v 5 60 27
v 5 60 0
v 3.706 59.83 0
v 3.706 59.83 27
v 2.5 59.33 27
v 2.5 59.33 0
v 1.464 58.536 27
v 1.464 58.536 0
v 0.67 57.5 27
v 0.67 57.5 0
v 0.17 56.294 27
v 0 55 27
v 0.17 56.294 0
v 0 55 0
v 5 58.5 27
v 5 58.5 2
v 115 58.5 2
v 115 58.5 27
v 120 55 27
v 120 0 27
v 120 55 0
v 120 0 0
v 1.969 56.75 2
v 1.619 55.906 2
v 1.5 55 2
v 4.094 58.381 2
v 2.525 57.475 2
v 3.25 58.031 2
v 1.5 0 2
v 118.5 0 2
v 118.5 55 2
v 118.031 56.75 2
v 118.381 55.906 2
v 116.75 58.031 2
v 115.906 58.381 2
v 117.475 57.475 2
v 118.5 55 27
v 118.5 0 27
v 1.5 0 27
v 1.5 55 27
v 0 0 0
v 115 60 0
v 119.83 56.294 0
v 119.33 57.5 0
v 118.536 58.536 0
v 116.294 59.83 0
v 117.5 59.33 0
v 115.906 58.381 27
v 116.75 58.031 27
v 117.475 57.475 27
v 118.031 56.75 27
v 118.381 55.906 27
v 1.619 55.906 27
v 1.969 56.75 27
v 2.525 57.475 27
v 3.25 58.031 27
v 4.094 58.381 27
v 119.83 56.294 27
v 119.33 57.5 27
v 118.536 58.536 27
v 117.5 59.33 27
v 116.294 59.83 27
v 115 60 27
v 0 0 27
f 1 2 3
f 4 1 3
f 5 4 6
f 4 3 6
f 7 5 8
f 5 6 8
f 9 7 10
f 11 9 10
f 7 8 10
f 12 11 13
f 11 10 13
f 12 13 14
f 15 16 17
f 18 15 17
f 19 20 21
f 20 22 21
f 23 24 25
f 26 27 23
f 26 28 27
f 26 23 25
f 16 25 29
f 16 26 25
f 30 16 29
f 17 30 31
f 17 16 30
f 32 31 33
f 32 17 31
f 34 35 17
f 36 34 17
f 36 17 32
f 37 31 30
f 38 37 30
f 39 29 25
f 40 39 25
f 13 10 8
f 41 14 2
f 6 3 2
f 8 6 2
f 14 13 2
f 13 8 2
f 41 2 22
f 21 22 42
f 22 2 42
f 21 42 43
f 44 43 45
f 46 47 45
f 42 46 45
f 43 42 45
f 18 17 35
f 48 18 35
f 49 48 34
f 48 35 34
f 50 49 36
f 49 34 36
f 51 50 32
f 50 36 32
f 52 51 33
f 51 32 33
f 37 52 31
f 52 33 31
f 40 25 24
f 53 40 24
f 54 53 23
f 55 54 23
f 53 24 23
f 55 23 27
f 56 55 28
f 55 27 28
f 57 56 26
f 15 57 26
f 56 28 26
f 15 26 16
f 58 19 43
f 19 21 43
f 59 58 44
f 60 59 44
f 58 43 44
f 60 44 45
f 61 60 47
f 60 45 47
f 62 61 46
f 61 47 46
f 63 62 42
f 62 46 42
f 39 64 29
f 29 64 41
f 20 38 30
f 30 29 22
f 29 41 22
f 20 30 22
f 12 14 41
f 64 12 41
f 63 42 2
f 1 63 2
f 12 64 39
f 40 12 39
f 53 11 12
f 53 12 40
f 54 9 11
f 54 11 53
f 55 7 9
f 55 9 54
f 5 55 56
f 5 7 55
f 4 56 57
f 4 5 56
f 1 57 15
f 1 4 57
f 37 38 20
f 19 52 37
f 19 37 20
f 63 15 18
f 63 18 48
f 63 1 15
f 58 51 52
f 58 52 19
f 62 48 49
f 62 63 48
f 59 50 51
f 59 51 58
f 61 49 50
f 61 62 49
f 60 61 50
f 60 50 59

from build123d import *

# Parameters (mm, degrees)
F1_DEPTH = 2
F3_DEPTH = 25


with BuildPart() as f1:
    # F0 (on Top) → F1 (new body)
    with BuildSketch(Plane.XY):
        with BuildLine():
            Line((0, 55), (0, 0))
            Line((0, 0), (120, 0))
            Line((120, 0), (120, 55))
            ThreePointArc((120, 55), (118.535534, 58.535534), (115, 60))
            Line((115, 60), (5, 60))
            ThreePointArc((5, 60), (1.464466, 58.535534), (0, 55))
        make_face()
    extrude(amount=F1_DEPTH)

    # F2 (on face) → F3 (join)
    with BuildSketch(Plane.XY.offset(2)):
        with BuildLine():
            Line((0, 55), (0, 0))
            Line((0, 0), (1.5, 0))
            Line((1.5, 0), (1.5, 55))
            ThreePointArc((1.5, 55), (2.525126, 57.474874), (5, 58.5))
            Line((5, 58.5), (115, 58.5))
            ThreePointArc((115, 58.5), (117.474874, 57.474874), (118.5, 55))
            Line((118.5, 55), (118.5, 0))
            Line((118.5, 0), (120, 0))
            Line((120, 0), (120, 55))
            ThreePointArc((120, 55), (118.535534, 58.535534), (115, 60))
            Line((115, 60), (5, 60))
            ThreePointArc((5, 60), (1.464466, 58.535534), (0, 55))
        make_face()
    extrude(amount=F3_DEPTH)


solid = f1.part
